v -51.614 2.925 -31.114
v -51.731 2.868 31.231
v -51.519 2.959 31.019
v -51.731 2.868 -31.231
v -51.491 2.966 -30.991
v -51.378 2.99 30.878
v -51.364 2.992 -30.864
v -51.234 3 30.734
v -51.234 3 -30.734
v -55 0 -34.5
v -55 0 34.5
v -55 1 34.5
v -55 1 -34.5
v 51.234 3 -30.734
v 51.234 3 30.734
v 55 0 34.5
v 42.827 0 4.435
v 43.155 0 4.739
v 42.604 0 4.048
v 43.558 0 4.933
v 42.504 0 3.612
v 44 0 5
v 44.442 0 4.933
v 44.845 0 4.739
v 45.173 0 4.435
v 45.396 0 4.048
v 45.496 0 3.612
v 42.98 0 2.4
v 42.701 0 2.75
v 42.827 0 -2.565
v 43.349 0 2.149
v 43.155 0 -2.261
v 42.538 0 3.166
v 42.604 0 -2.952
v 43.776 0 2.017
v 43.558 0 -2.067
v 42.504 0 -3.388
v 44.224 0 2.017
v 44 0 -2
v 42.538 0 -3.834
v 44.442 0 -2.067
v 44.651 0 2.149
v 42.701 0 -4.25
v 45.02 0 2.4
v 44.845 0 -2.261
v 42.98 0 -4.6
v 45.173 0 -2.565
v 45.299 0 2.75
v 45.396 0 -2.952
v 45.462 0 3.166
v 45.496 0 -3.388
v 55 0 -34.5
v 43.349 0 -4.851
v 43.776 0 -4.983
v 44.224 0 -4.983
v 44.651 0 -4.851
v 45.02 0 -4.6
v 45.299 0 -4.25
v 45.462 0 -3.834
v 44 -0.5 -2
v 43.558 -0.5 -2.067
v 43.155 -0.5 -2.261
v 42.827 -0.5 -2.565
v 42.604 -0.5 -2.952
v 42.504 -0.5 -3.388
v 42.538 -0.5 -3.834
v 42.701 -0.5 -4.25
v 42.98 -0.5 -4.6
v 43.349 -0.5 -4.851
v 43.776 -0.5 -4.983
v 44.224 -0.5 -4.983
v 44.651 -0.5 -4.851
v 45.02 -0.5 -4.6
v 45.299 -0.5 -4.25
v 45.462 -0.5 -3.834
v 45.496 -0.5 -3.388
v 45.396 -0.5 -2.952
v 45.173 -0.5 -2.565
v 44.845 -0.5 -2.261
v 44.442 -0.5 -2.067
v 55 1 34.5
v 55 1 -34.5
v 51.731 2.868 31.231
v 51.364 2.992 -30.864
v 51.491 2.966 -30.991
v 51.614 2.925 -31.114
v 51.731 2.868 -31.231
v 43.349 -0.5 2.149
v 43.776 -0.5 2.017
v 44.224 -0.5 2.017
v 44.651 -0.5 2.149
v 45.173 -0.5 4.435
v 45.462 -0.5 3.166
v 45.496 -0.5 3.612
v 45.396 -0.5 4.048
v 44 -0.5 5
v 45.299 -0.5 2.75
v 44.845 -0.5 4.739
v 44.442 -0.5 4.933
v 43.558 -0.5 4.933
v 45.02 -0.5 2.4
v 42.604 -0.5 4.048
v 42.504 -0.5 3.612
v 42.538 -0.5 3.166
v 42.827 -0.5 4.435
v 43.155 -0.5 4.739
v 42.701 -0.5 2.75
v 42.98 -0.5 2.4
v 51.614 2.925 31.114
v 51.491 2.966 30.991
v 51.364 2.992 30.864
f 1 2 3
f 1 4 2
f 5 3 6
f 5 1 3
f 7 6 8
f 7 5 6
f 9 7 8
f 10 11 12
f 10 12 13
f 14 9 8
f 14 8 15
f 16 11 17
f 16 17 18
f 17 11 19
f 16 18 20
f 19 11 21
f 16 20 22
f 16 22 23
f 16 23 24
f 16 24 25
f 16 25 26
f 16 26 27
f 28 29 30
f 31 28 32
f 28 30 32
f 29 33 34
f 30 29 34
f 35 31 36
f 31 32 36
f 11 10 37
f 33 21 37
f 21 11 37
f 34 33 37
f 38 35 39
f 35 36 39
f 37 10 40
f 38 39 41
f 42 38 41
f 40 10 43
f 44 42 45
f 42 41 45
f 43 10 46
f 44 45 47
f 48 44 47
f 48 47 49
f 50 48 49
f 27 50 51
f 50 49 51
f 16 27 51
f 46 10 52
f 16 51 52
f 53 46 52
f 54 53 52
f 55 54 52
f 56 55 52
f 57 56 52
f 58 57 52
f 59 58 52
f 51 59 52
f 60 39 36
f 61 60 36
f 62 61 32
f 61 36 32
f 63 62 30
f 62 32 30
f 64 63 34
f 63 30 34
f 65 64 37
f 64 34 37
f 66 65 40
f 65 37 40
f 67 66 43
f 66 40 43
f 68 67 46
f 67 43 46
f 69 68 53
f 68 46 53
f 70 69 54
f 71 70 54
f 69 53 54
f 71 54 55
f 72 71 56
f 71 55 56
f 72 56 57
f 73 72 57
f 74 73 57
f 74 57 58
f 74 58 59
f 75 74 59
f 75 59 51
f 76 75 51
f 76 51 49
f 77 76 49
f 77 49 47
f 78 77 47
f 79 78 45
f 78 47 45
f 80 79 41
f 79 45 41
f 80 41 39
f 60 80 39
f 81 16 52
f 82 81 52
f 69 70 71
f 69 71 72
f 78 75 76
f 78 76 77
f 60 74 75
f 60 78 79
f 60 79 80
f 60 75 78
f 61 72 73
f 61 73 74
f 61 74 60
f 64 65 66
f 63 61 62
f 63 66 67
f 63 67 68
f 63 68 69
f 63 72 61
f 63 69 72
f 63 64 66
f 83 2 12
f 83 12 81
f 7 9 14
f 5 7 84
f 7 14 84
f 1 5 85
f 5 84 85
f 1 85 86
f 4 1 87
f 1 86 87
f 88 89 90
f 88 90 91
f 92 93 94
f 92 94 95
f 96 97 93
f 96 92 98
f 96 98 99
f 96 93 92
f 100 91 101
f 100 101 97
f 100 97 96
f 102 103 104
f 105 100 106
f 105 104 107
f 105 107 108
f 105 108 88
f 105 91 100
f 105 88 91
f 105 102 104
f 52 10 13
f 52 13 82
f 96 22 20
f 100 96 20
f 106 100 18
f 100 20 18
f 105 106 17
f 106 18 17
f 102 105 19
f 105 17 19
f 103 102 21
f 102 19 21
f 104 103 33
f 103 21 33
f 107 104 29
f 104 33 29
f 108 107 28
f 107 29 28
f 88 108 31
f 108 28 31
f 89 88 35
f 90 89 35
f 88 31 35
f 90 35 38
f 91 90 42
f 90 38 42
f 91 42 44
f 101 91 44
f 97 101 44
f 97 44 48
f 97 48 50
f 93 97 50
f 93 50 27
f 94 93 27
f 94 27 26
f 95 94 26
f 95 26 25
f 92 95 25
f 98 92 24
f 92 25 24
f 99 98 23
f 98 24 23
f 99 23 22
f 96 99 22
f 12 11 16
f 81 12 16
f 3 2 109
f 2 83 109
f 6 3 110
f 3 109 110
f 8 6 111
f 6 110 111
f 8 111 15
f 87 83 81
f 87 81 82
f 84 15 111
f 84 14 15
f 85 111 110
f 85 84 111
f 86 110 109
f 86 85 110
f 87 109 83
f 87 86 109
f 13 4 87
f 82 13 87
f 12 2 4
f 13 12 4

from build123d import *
from OCP.BRepFilletAPI import BRepFilletAPI_MakeChamfer

# Parameters (mm, degrees)
SKETCH1_W           = 110
SKETCH1_H           = 69
BOSS_EXTRUDE1_DEPTH = 3
CHAMFER1_SIZE       = 2
CHAMFER1_SIZE2      = 3.5
FILLET1_R           = 1
SKETCH2_R           = 1.5
BOSS_EXTRUDE2_DEPTH = 0.5


with BuildPart() as part:
    # Sketch1 → Boss-Extrude1 (new body)
    with BuildSketch(Plane(origin=(0, 0, 0), x_dir=(1, 0, 0), z_dir=(0, 1, 0))):
        Rectangle(SKETCH1_W, SKETCH1_H)
    extrude(amount=BOSS_EXTRUDE1_DEPTH)

    # Chamfer1: one chamfer whose edges measure the first distance from different faces: ONE call of the kernel's chamfer builder (chamfer() names one face for all edges)
    chamfer1_edges_1 = [part.edges().sort_by_distance(p)[0] for p in [
        (-55, 3, 0),
    ]]
    chamfer1_side_1 = [part.faces().sort_by_distance(p)[0] for p in [
        (-55, 1.5, 0),
    ]]
    chamfer1_edges_2 = [part.edges().sort_by_distance(p)[0] for p in [
        (0, 3, 34.5),
    ]]
    chamfer1_side_2 = [part.faces().sort_by_distance(p)[0] for p in [
        (0, 1.5, 34.5),
    ]]
    chamfer1_edges_3 = [part.edges().sort_by_distance(p)[0] for p in [
        (55, 3, 0),
    ]]
    chamfer1_side_3 = [part.faces().sort_by_distance(p)[0] for p in [
        (55, 1.5, 0),
    ]]
    chamfer1_edges_4 = [part.edges().sort_by_distance(p)[0] for p in [
        (0, 3, -34.5),
    ]]
    chamfer1_side_4 = [part.faces().sort_by_distance(p)[0] for p in [
        (0, 1.5, -34.5),
    ]]
    chamfer1 = BRepFilletAPI_MakeChamfer(part.part.solid().wrapped)
    for e in chamfer1_edges_1:
        chamfer1.Add(CHAMFER1_SIZE, CHAMFER1_SIZE2, e.wrapped, chamfer1_side_1[0].wrapped)  # the first distance lies on this face
    for e in chamfer1_edges_2:
        chamfer1.Add(CHAMFER1_SIZE, CHAMFER1_SIZE2, e.wrapped, chamfer1_side_2[0].wrapped)  # the first distance lies on this face
    for e in chamfer1_edges_3:
        chamfer1.Add(CHAMFER1_SIZE, CHAMFER1_SIZE2, e.wrapped, chamfer1_side_3[0].wrapped)  # the first distance lies on this face
    for e in chamfer1_edges_4:
        chamfer1.Add(CHAMFER1_SIZE, CHAMFER1_SIZE2, e.wrapped, chamfer1_side_4[0].wrapped)  # the first distance lies on this face
    add(Compound.cast(chamfer1.Shape()), mode=Mode.REPLACE)

    # Fillet1
    fillet1_edges = [part.edges().sort_by_distance(p)[0] for p in [
        (51.5, 3, 0),
        (0, 3, -31),
        (-51.5, 3, 0),
        (0, 3, 31),
    ]]
    fillet(fillet1_edges, radius=FILLET1_R)

    # Sketch2 → Boss-Extrude2 (add)
    with BuildSketch(Plane.XZ):
        with Locations(Location((44, 3.5, 0), (0, 0, 90))):
            Circle(SKETCH2_R)
        with Locations(Location((44, -3.5, 0), (0, 0, 90))):
            Circle(SKETCH2_R)
    extrude(amount=BOSS_EXTRUDE2_DEPTH)


solid = part.part
